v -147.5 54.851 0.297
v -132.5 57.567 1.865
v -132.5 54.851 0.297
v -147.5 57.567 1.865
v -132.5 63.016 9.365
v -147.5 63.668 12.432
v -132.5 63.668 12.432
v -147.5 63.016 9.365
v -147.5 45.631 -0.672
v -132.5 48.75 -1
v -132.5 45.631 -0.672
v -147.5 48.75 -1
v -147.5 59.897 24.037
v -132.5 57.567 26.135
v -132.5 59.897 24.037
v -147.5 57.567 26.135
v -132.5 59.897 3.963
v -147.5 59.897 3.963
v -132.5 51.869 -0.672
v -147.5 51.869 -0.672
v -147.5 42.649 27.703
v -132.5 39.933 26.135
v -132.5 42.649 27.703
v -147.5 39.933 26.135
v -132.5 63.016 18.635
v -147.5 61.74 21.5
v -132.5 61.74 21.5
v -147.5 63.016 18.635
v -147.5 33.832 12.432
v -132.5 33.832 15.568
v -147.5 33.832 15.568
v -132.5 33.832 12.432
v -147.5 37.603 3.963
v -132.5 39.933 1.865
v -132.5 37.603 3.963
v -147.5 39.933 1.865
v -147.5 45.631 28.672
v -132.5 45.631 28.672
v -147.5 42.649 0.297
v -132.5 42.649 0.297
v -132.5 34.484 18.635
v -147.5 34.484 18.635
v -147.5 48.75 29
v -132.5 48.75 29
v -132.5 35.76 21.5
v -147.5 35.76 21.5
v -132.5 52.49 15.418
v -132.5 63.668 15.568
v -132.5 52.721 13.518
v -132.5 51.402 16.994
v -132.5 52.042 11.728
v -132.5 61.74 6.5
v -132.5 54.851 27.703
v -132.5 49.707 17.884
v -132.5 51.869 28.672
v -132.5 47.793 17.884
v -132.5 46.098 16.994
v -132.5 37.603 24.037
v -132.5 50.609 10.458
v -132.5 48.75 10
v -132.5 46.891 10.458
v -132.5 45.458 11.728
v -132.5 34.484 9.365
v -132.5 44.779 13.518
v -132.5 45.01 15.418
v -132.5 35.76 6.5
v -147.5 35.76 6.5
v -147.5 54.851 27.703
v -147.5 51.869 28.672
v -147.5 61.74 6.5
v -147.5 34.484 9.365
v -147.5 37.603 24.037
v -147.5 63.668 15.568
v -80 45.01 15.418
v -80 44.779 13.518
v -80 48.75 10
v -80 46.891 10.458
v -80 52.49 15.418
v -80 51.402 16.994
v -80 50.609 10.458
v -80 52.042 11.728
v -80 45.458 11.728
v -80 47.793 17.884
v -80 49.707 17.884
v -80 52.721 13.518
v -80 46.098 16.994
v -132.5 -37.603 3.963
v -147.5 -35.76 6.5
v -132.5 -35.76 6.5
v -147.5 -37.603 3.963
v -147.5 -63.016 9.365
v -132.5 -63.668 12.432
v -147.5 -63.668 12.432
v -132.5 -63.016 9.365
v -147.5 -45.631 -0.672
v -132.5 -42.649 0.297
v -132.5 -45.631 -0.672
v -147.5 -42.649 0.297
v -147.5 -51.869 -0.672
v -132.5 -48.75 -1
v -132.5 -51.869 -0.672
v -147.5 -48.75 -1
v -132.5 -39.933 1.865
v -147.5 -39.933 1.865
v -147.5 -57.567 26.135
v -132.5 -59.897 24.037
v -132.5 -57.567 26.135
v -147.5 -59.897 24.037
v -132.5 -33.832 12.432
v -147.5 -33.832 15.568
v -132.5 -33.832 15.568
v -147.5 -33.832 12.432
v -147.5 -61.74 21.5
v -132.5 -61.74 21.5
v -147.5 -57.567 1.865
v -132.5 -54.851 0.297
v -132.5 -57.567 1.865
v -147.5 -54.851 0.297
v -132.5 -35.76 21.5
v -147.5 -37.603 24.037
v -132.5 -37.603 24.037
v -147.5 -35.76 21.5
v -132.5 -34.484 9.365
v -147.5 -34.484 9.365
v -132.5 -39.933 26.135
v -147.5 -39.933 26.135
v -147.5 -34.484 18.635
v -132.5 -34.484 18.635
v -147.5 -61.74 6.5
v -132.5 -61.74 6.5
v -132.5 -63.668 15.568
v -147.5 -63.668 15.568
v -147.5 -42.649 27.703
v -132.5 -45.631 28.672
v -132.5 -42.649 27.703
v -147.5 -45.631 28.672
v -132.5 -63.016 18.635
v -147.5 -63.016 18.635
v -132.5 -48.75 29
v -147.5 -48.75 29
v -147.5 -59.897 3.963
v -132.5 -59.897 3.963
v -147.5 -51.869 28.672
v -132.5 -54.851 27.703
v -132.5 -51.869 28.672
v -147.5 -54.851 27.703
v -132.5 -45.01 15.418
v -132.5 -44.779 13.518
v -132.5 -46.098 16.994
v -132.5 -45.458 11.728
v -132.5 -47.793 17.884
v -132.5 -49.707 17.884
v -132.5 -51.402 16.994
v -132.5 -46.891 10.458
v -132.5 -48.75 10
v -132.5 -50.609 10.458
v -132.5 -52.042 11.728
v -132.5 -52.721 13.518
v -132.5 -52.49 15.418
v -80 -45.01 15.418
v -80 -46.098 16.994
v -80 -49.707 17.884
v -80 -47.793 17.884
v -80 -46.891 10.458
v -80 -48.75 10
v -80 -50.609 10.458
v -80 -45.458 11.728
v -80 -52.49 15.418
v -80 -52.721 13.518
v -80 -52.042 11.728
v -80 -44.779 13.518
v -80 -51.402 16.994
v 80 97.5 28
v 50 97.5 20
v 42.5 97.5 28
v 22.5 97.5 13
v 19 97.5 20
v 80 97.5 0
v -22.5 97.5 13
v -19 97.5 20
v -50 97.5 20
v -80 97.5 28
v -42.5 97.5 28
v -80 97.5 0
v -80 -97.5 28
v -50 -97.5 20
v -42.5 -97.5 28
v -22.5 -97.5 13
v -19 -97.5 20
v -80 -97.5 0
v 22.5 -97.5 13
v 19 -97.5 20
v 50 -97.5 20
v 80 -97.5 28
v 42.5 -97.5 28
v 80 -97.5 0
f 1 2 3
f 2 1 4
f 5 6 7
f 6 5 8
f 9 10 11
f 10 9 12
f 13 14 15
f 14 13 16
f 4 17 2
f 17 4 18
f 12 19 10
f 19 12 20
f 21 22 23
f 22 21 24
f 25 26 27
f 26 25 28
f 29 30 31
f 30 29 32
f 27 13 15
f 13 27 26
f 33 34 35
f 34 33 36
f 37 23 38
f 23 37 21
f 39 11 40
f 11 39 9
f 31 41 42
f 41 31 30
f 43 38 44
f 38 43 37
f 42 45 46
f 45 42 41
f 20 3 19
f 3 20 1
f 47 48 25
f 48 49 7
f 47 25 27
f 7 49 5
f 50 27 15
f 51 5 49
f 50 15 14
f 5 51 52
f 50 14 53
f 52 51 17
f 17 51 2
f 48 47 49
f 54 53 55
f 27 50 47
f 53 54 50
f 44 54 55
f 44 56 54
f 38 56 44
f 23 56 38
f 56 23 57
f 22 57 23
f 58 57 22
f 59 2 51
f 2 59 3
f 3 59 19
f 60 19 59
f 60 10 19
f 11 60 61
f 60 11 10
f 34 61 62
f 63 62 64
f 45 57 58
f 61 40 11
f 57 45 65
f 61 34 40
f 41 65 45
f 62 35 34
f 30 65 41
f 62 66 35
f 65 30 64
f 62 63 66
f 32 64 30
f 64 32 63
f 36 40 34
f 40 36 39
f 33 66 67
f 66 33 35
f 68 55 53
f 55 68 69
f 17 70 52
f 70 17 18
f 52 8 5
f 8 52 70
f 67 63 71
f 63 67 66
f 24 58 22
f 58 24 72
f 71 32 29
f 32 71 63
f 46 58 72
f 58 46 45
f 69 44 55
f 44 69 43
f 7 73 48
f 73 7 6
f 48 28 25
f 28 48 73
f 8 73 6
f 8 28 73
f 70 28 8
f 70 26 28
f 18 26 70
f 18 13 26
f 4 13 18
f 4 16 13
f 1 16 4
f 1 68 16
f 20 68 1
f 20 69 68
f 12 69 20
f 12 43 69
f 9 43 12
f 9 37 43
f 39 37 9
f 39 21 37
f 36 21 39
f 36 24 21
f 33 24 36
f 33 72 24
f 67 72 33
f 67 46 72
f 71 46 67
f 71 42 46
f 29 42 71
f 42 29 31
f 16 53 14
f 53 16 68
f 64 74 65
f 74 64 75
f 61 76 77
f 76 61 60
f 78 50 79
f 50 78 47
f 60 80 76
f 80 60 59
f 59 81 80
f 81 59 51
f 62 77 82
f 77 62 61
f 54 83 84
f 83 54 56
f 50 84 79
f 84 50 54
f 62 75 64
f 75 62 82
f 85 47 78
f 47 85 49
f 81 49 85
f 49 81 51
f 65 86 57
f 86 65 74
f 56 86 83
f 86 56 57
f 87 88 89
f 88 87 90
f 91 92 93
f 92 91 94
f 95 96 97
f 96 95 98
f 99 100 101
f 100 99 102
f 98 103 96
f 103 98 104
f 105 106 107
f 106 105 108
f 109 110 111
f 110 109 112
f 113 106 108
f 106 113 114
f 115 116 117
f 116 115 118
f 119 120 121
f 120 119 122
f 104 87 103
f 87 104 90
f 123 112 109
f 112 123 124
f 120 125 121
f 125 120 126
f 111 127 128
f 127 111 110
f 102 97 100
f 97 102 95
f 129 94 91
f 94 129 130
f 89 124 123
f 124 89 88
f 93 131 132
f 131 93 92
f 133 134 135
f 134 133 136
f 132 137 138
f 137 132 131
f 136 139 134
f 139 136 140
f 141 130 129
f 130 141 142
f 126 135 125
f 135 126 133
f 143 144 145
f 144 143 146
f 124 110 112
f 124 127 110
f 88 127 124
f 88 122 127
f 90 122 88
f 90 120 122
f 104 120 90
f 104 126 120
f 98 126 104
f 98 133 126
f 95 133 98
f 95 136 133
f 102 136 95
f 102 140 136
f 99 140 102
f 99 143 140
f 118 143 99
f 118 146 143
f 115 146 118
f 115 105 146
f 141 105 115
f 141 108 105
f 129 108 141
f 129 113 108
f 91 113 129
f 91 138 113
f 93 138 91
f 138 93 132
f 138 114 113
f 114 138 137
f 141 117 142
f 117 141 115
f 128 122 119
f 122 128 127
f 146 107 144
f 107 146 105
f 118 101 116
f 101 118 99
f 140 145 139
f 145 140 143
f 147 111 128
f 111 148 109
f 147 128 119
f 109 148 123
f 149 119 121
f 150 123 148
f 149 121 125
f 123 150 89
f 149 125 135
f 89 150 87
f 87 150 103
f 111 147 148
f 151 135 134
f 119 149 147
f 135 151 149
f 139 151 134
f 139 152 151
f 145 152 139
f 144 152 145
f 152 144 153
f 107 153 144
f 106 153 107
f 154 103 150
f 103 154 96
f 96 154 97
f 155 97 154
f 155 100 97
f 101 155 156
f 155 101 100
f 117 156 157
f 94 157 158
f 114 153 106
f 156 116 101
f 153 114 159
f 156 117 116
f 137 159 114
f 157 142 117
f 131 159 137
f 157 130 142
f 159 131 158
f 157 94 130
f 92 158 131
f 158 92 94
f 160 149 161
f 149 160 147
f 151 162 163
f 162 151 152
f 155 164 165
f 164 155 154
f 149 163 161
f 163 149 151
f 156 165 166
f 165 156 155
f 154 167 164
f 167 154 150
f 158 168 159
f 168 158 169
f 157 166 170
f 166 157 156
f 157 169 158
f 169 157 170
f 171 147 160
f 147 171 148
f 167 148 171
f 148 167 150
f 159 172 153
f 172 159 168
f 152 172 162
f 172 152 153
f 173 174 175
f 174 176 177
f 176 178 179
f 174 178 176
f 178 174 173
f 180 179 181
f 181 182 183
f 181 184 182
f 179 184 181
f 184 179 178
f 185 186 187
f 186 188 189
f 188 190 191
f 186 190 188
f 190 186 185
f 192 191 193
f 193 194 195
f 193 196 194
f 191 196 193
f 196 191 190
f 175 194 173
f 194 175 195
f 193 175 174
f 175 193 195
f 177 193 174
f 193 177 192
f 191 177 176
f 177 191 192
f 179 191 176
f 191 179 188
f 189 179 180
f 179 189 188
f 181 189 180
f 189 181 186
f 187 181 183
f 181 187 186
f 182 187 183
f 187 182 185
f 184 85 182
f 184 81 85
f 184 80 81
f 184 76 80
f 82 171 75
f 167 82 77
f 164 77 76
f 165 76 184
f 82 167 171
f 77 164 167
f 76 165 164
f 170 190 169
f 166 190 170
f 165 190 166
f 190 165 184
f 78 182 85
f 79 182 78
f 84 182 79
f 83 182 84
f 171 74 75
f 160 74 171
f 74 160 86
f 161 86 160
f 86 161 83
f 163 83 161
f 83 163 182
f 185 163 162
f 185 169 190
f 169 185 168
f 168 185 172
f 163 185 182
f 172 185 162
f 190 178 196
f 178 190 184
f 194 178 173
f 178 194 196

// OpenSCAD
//模块 -  安装望远镜的鸠尾槽
tail_for_telescope_width=160;
tail_for_telescope_thickness=28;
tail_for_telescope_cut1_length=85;
tail_for_telescope_cut2_length=100;
tail_for_telescope_cut3_thickness=20;


2047studio_dovetail_dule_saddle(195,2);
module 2047studio_dovetail_dule_saddle(tail_for_telescope_length,position){
    
    if(position==1){
    //旋转把手
    translate([tail_for_telescope_width/2+20,0,tail_for_telescope_thickness/2])
    rotate([0,90,0])
    cylinder(h=15,d=30,center=true);
    
        translate([tail_for_telescope_width/2-5+10,0,tail_for_telescope_thickness/2])
    rotate([0,90,0])
    cylinder(h=15,d=8,center=true);}
    else
    {
          //旋转把手
    translate([-tail_for_telescope_width/2-20-40,tail_for_telescope_length/4,tail_for_telescope_thickness/2])
    rotate([0,90,0])
    cylinder(h=15,d=30,center=true);
    
        translate([-tail_for_telescope_width/2-5-20,tail_for_telescope_length/4,tail_for_telescope_thickness/2])
    rotate([0,90,0])
    cylinder(h=55,d=8,center=true);  
        
        translate([-tail_for_telescope_width/2-20-40,-tail_for_telescope_length/4,tail_for_telescope_thickness/2])
    rotate([0,90,0])
    cylinder(h=15,d=30,center=true);
    
        translate([-tail_for_telescope_width/2-5-20,-tail_for_telescope_length/4,tail_for_telescope_thickness/2])
    rotate([0,90,0])
    cylinder(h=55,d=8,center=true);  
        }
    
    //槽面
 
  
    color("red",0.8)
    translate([-tail_for_telescope_width/2,tail_for_telescope_length/2,])
    rotate([90,0,0])
linear_extrude(tail_for_telescope_length)
 polygon(points=[[0,0],[tail_for_telescope_width,0],
 
 //右上角
 [tail_for_telescope_width,tail_for_telescope_thickness],
 [tail_for_telescope_width-(tail_for_telescope_width-tail_for_telescope_cut1_length)/2,tail_for_telescope_thickness],
 
  [tail_for_telescope_width-(tail_for_telescope_width-tail_for_telescope_cut2_length)/2,
        tail_for_telescope_cut3_thickness],

    [tail_for_telescope_width/2+19,tail_for_telescope_cut3_thickness],
     
      [tail_for_telescope_width/2+22.5,tail_for_telescope_cut3_thickness-7],
      [tail_for_telescope_width/2-22.5,tail_for_telescope_cut3_thickness-7],
      [tail_for_telescope_width/2-19,tail_for_telescope_cut3_thickness],
      
    [(tail_for_telescope_width-tail_for_telescope_cut2_length)/2,tail_for_telescope_cut3_thickness],
    

    
     [(tail_for_telescope_width-tail_for_telescope_cut1_length)/2,tail_for_telescope_thickness],
 //左上角
  [0,tail_for_telescope_thickness],
 ]);
 
 }
